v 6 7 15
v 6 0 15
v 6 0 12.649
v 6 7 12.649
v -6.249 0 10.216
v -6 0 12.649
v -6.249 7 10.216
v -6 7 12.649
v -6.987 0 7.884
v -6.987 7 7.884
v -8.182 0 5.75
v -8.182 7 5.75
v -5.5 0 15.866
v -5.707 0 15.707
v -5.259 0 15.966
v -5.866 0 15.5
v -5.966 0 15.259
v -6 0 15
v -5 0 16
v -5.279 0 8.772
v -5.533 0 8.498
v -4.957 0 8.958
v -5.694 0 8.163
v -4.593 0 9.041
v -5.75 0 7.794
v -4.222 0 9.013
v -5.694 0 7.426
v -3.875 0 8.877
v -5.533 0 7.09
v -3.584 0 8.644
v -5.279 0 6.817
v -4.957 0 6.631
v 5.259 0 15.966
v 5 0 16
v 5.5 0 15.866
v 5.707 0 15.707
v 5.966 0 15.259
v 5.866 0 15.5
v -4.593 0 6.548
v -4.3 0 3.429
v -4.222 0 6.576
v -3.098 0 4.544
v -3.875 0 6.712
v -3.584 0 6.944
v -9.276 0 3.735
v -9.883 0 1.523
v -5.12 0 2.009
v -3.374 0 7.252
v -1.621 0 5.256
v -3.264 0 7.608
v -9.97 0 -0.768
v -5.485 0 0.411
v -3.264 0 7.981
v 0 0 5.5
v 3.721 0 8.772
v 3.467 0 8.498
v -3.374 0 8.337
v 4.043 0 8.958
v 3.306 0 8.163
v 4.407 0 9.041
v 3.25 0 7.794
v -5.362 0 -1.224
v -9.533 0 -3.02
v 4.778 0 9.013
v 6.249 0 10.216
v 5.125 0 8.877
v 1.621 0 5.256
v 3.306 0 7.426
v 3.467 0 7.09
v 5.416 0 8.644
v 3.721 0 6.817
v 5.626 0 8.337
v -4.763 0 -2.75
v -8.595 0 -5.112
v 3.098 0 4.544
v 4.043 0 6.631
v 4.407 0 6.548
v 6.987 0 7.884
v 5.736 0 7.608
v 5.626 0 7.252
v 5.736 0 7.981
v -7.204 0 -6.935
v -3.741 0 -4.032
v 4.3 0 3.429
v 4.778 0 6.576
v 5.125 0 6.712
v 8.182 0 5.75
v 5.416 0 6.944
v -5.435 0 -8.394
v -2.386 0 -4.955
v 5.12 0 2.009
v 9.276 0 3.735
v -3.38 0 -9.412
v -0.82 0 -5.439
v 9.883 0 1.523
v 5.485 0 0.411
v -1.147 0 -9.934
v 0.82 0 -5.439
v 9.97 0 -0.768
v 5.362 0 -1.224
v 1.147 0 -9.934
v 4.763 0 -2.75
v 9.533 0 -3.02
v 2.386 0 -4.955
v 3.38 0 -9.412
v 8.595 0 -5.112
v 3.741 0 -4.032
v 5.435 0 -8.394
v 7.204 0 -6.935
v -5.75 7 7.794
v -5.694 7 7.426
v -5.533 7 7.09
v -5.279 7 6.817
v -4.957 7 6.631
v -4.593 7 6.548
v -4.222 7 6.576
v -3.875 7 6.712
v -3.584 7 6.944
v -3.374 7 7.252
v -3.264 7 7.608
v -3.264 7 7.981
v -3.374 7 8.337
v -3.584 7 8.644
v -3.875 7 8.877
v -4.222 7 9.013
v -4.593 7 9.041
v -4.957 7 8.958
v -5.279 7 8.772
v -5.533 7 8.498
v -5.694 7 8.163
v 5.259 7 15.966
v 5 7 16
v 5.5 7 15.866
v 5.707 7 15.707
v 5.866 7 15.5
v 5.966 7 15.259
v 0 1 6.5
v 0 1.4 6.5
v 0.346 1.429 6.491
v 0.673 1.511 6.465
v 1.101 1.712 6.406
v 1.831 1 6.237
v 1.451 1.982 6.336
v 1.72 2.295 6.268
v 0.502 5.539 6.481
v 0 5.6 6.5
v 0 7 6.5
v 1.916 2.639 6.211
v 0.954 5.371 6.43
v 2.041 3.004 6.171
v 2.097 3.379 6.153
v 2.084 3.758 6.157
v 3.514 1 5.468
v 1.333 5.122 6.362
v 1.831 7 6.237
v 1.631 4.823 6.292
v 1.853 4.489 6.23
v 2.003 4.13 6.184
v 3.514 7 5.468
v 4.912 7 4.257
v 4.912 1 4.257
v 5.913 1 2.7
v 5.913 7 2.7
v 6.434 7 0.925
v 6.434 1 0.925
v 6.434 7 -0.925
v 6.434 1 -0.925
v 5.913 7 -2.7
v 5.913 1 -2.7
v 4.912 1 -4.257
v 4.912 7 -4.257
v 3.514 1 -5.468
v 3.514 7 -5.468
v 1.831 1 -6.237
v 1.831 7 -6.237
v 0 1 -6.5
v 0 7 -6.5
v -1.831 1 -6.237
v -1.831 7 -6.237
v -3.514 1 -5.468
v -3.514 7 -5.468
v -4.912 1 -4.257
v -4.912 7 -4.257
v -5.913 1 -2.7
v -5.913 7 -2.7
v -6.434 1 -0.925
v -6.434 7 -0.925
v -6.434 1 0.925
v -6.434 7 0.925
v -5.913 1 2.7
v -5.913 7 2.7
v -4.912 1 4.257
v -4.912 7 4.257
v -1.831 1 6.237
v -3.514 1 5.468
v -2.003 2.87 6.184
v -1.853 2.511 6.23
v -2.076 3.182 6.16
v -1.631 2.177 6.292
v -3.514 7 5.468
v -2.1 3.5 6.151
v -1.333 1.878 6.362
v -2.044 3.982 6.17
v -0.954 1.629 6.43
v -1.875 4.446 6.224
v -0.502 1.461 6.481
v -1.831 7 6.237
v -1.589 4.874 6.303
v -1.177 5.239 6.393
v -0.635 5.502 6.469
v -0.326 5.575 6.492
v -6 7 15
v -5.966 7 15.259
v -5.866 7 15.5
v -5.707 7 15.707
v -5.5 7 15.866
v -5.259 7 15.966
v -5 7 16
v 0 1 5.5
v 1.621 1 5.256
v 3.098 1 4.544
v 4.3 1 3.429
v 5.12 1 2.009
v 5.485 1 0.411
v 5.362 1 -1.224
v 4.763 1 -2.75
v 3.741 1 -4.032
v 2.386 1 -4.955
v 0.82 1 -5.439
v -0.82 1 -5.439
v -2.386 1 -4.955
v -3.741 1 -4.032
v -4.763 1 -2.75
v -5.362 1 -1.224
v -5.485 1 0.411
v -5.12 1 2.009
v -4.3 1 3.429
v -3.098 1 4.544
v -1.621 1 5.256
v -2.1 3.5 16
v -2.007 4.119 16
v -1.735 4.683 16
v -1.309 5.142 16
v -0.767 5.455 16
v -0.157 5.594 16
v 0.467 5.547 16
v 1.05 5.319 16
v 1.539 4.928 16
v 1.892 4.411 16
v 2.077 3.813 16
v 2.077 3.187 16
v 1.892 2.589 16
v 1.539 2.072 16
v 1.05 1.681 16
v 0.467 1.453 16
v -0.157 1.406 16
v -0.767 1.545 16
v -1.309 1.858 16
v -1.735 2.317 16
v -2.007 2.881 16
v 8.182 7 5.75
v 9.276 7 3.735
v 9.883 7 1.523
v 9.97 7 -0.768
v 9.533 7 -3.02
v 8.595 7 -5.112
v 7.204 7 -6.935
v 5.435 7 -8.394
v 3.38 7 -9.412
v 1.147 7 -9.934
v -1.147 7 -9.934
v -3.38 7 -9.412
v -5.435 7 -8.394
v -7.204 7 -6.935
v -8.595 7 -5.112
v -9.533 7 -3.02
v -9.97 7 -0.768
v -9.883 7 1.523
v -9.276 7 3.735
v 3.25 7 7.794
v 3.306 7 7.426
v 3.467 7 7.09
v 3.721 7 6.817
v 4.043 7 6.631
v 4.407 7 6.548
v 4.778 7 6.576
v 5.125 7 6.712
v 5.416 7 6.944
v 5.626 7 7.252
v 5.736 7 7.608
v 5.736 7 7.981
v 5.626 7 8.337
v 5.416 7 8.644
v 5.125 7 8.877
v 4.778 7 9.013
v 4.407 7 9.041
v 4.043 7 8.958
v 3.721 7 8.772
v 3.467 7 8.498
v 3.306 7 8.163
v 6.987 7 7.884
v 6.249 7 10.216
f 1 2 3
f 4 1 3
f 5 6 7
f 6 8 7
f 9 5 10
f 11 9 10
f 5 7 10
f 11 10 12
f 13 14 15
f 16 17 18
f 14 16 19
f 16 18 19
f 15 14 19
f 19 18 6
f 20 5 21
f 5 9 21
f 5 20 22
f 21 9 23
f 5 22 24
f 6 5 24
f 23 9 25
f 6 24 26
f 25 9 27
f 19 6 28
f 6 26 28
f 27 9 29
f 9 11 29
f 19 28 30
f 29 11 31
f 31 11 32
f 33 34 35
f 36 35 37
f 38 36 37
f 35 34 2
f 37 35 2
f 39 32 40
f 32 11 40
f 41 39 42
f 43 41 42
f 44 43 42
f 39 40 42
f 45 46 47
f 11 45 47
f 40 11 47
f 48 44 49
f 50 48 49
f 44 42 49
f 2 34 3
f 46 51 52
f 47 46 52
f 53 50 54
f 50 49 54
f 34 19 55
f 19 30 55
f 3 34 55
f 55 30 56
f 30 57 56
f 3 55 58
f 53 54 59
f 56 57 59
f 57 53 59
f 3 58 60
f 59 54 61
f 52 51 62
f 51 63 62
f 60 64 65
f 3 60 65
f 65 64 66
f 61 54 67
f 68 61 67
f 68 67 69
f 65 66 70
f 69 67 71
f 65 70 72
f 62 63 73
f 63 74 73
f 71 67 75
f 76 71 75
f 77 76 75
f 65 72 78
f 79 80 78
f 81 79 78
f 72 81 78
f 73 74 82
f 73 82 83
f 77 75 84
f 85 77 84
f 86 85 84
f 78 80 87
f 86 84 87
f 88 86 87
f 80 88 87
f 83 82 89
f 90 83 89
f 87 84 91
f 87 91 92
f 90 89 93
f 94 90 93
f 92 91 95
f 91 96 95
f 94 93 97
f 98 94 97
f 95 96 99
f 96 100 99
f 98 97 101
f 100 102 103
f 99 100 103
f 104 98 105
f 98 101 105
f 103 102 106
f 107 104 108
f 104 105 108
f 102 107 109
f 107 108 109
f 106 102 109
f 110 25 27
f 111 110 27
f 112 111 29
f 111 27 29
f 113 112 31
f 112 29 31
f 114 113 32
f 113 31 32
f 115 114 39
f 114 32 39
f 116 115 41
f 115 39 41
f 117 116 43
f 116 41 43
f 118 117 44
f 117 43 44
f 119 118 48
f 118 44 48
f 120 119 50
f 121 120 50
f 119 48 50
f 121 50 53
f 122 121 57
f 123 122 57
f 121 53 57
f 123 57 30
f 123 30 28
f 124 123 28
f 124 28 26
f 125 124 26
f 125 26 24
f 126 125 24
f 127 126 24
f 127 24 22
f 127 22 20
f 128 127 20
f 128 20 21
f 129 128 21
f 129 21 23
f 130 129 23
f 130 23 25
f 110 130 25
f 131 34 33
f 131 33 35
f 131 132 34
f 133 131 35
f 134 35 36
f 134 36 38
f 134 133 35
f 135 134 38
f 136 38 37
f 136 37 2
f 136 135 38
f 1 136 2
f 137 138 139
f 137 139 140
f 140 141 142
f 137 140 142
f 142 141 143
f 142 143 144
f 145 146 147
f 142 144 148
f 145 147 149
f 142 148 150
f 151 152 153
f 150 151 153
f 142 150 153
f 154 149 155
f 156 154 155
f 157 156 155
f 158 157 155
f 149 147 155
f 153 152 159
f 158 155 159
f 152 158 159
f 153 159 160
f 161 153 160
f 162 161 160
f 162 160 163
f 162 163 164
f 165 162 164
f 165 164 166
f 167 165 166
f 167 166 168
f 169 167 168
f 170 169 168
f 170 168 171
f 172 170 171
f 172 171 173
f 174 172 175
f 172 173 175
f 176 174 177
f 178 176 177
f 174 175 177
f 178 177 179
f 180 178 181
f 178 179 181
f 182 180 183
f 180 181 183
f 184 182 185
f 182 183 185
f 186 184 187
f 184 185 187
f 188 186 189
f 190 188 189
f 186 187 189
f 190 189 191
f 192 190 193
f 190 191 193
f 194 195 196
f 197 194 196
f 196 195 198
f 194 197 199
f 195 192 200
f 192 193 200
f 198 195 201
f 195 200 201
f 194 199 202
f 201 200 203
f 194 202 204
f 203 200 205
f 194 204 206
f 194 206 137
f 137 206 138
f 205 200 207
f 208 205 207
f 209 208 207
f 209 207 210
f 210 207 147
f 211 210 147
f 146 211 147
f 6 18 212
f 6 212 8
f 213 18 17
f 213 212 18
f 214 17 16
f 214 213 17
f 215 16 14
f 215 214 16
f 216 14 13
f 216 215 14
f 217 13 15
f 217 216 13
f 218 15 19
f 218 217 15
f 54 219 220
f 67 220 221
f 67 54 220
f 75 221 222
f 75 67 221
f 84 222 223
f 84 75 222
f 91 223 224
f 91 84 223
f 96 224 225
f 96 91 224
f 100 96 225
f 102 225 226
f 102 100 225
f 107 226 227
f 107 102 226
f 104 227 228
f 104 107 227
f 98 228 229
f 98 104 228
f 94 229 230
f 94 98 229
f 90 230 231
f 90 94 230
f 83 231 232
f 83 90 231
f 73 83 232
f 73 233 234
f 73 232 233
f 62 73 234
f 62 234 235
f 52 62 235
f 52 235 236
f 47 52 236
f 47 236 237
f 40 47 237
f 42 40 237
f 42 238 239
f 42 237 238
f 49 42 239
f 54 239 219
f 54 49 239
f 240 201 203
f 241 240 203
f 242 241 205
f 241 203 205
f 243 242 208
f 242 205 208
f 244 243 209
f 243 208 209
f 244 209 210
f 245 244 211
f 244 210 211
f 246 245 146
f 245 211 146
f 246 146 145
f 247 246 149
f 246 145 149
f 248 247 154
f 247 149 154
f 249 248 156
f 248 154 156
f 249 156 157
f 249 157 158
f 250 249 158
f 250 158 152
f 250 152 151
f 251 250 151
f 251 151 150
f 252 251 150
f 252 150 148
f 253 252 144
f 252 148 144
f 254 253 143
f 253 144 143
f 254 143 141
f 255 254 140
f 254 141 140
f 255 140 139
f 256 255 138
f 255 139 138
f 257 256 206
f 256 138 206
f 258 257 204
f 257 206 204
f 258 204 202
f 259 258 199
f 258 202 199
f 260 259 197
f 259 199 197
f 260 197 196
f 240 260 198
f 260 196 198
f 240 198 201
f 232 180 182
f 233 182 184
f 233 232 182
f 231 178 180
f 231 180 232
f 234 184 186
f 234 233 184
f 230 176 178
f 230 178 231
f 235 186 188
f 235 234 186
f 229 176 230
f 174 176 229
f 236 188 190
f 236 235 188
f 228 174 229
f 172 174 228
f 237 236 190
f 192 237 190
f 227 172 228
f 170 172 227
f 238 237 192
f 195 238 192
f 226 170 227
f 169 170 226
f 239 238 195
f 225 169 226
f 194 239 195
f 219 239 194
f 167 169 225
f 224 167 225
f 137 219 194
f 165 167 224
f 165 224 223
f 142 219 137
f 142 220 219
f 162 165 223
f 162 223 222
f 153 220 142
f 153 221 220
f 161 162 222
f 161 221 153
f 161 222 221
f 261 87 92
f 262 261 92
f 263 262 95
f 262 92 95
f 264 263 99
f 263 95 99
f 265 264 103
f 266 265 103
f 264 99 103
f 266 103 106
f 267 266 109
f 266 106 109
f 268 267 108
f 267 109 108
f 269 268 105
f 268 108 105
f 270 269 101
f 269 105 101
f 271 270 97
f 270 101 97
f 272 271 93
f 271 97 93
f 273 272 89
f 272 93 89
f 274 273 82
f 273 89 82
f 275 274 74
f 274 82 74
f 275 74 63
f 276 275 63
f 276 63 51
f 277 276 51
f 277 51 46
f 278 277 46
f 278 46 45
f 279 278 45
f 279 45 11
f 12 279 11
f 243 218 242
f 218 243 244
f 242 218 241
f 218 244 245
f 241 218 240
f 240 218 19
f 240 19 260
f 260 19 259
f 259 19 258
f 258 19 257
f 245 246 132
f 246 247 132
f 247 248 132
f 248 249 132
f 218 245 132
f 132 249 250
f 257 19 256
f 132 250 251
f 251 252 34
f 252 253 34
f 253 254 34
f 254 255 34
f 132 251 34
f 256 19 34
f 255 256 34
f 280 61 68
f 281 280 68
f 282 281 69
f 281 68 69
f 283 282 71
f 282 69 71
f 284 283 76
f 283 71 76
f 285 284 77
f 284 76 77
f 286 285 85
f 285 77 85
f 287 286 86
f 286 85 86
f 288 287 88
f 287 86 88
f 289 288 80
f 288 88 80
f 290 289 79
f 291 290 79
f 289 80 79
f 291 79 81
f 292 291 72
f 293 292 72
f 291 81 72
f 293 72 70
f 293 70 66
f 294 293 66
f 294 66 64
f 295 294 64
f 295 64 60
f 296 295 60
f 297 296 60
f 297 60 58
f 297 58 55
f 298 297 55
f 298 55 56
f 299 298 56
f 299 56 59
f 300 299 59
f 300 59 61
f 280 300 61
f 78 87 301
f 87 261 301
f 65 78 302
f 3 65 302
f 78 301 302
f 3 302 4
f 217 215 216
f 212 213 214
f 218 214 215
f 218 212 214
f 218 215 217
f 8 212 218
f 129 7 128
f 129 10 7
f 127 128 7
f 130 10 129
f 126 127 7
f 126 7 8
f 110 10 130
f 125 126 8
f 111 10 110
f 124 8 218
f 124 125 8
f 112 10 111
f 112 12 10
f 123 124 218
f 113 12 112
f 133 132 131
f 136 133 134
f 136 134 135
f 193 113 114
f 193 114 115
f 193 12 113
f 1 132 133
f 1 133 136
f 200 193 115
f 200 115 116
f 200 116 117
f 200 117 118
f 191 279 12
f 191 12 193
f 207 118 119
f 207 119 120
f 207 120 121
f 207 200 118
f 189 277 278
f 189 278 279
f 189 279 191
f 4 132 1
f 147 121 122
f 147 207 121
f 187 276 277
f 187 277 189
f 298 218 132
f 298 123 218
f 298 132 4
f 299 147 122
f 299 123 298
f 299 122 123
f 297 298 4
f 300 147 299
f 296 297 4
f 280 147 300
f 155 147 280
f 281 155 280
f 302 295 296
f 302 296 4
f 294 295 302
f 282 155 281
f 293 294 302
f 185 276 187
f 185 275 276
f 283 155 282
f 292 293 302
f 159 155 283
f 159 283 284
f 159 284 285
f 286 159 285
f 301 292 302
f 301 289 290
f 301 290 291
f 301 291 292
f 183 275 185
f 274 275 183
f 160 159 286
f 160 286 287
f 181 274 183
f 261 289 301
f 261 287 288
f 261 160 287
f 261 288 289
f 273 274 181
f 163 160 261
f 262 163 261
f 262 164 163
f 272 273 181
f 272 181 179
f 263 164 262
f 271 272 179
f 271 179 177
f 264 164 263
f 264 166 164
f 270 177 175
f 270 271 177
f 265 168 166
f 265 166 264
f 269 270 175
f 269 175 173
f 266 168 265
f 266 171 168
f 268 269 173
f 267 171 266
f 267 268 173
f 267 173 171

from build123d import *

# Parameters (mm, degrees)
ESQUISSE1_R             = 10
ESQUISSE1_R_2           = 5.5
BOSS_EXTRU_1_DEPTH      = 7
ESQUISSE2_R             = 6.5
ENL_V_MAT_EXTRU_1_DEPTH = 6
ESQUISSE7_W             = 12
ESQUISSE7_H             = 8
BOSS_EXTRU_2_DEPTH      = 7
CONG_1_R                = 12
TROU_TARAUD_M31_D       = 2.5
TROU_TARAUD_M51_D       = 4.2
TROU_TARAUD_M51_DEPTH   = 16
TROU_TARAUD_M51_TIP     = 1.2618073
CONG_2_R                = 1


with BuildPart() as part:
    # Esquisse1 → Boss.-Extru.1 (new body)
    with BuildSketch(Plane(origin=(0, 0, 0), x_dir=(1, 0, 0), z_dir=(0, 1, 0))):
        with Locations(Location((0, 0, 0), (0, 0, 270))):  # turned: the seam where the file's is
            Circle(ESQUISSE1_R)
        with Locations(Location((0, 0, 0), (0, 0, 270))):  # turned: the seam where the file's is
            Circle(ESQUISSE1_R_2, mode=Mode.SUBTRACT)
    extrude(amount=BOSS_EXTRU_1_DEPTH)

    # Esquisse2 → Enlèv. mat.-Extru.1 (cut)
    with BuildSketch(Plane(origin=(0, 7, 0), x_dir=(1, 0, 0), z_dir=(0, 1, 0))):
        with Locations(Location((0, 0, 0), (0, 0, 270))):  # turned: the seam where the file's is
            Circle(ESQUISSE2_R)
    extrude(amount=-ENL_V_MAT_EXTRU_1_DEPTH, mode=Mode.SUBTRACT)

    # Esquisse7 → Boss.-Extru.2 (add)
    with BuildSketch(Plane(origin=(0, 0, 0), x_dir=(1, 0, 0), z_dir=(0, 1, 0))):
        with Locations((0, -12)):
            Rectangle(ESQUISSE7_W, ESQUISSE7_H)
    extrude(amount=BOSS_EXTRU_2_DEPTH)

    # Congé1
    cong_1_edges = [part.edges().sort_by_distance(p)[0] for p in [
        (-6, 3.5, 8),
        (6, 3.5, 8),
    ]]
    fillet(cong_1_edges, radius=CONG_1_R)

    # Trou taraudé M31 (through all)
    with Locations(Plane(origin=(0, 7, 0), x_dir=(1, 0, 0), z_dir=(0, 1, 0))):
        with Locations((4.5, -7.794228634), (-4.5, -7.794228634)):
            Hole(TROU_TARAUD_M31_D / 2)

    # Trou taraudé M51
    with Locations(Plane.XY.offset(16)):
        with Locations((0, 3.5)):
            Hole(TROU_TARAUD_M51_D / 2, depth=TROU_TARAUD_M51_DEPTH)
            with Locations((0, 0, -(TROU_TARAUD_M51_DEPTH + TROU_TARAUD_M51_TIP / 2))):  # 118° drill point
                Cone(0, TROU_TARAUD_M51_D / 2, TROU_TARAUD_M51_TIP, mode=Mode.SUBTRACT)

    # Congé2
    cong_2_edges = [part.edges().sort_by_distance(p)[0] for p in [
        (-6, 3.5, 16),
        (6, 3.5, 16),
    ]]
    fillet(cong_2_edges, radius=CONG_2_R)


solid = part.part
